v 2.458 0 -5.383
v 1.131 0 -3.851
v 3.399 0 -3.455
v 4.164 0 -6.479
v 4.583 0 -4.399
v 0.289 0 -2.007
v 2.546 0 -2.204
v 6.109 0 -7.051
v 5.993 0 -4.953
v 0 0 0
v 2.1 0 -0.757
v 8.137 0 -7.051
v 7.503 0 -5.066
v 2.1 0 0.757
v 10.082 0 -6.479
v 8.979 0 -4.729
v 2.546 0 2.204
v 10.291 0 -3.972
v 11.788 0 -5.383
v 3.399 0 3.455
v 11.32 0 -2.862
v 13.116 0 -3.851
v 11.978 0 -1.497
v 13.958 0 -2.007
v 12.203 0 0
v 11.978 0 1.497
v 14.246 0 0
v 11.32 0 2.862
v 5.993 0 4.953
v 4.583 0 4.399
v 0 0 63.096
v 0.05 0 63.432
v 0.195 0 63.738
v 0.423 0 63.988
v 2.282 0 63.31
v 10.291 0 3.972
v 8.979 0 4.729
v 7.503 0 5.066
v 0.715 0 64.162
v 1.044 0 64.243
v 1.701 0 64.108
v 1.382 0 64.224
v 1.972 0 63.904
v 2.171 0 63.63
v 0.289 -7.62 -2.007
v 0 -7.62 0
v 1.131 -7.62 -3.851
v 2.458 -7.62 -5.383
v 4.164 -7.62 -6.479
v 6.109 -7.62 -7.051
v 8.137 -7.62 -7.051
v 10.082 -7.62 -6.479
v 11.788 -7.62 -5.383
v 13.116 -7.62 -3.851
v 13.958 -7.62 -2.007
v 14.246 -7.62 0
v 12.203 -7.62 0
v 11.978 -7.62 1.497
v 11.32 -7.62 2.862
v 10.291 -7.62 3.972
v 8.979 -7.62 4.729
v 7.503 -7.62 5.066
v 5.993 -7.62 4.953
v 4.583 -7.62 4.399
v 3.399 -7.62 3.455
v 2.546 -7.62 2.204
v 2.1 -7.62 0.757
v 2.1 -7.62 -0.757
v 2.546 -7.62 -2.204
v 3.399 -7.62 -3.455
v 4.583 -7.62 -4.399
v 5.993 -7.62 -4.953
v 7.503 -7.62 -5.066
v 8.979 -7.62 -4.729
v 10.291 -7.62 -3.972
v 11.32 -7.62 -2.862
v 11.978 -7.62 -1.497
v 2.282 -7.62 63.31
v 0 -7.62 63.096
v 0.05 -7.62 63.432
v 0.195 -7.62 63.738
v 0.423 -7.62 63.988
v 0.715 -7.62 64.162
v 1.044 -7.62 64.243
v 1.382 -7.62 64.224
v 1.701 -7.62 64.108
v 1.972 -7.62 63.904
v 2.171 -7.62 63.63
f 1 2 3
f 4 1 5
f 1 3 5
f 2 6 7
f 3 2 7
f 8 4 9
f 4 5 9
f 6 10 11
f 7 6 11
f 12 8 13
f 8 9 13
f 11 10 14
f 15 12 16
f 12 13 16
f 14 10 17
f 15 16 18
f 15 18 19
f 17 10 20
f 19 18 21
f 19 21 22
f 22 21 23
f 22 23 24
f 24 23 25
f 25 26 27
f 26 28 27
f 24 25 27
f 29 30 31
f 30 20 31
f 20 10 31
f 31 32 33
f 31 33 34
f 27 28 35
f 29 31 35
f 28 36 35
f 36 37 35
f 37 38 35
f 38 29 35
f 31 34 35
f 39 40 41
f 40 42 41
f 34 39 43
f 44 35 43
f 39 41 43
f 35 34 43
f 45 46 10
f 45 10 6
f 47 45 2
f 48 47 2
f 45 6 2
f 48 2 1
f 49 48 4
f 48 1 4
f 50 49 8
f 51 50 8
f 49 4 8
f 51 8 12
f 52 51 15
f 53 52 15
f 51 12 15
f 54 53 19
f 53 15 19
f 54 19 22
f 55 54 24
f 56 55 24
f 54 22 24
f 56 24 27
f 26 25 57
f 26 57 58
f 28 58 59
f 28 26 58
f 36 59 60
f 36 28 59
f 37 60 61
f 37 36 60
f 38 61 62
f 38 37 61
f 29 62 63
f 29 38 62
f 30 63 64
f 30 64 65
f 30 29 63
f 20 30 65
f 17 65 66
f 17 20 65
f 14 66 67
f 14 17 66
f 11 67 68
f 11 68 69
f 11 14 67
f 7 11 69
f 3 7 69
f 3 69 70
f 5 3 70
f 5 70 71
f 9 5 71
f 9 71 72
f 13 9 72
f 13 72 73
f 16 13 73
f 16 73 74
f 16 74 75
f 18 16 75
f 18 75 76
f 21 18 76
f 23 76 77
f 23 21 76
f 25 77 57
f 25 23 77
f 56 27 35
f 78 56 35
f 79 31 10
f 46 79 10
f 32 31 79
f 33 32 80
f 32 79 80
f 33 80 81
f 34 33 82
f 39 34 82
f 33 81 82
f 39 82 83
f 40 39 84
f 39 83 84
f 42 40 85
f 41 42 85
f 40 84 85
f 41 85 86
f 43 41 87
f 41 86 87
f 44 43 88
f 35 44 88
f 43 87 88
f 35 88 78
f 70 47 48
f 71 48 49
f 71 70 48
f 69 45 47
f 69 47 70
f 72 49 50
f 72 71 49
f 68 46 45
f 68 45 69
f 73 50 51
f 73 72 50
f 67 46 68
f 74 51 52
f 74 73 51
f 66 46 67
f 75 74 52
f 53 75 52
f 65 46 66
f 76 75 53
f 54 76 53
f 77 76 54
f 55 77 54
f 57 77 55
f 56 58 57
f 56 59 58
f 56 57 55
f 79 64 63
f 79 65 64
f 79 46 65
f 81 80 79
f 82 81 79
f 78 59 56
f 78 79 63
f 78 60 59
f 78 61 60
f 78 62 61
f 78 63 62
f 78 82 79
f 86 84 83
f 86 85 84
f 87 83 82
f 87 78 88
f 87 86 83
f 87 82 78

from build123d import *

# Parameters (mm, degrees)
F0_R     = 5.08
F1_DEPTH = 7.62
F2_R     = 1.15124


with BuildPart() as f1:
    # F0 (on Front) → F1 (new body)
    with BuildSketch(Plane.XZ):
        with BuildLine():
            Line((0, 75.388283), (0, 0))
            ThreePointArc((0, 0), (7.123203, -7.123203), (14.246407, 0))
            Line((14.246407, 0), (0, 75.388283))
        make_face()
        with Locations((7.123203, 0)):
            Circle(F0_R, mode=Mode.SUBTRACT)
    extrude(amount=F1_DEPTH)

    # F2
    f2_edges = [f1.edges().sort_by_distance(p)[0] for p in [
        (0, -3.81, 75.388283),
    ]]
    fillet(f2_edges, radius=F2_R)


solid = f1.part
